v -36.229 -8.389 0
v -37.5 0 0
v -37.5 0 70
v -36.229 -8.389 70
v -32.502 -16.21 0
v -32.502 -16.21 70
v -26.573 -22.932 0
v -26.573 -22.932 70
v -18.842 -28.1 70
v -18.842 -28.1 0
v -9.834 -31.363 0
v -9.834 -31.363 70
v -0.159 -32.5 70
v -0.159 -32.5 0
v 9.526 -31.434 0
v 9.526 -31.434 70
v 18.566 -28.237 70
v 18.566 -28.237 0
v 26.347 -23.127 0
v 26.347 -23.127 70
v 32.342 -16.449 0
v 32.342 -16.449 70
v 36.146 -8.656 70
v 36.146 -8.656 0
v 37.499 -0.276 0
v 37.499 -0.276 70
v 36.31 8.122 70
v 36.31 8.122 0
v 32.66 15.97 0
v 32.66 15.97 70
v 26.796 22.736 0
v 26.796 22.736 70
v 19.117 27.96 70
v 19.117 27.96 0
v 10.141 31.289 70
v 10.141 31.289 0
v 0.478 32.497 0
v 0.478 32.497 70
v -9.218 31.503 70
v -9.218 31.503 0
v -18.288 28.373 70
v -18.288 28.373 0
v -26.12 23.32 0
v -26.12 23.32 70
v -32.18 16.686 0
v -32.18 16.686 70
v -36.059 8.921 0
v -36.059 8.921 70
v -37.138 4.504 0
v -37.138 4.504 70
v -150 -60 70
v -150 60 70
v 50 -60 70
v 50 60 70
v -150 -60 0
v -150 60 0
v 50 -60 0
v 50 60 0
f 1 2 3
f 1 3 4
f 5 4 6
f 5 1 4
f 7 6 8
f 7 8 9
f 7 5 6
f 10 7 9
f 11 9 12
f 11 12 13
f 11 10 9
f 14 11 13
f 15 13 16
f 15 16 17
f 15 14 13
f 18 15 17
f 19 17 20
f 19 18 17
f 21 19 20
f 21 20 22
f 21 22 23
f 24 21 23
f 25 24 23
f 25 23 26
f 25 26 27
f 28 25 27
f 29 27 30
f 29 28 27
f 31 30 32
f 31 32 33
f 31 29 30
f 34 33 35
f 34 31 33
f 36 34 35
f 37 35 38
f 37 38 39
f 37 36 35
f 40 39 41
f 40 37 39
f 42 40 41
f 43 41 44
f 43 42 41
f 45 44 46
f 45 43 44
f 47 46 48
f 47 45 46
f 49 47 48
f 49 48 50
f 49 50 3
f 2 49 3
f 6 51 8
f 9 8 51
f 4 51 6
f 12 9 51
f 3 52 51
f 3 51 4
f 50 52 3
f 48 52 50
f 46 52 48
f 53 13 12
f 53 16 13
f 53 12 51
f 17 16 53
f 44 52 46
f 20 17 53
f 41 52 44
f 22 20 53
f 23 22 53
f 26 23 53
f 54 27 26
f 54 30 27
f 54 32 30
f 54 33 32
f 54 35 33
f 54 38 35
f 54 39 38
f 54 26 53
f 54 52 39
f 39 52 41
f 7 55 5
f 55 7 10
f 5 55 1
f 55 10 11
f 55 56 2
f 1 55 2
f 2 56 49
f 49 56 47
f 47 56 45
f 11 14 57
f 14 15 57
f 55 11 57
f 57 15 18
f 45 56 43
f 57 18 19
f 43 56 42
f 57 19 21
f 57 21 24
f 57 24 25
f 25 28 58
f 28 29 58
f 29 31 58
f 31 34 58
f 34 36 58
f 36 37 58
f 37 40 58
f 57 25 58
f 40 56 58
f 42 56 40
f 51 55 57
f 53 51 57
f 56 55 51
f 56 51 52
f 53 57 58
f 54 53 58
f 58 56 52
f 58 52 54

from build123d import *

# Parameters (mm, degrees)
SKETCH1_W           = 200
SKETCH1_H           = 120
SKETCH1_RX          = 37.5
SKETCH1_RY          = 32.5
BOSS_EXTRUDE1_DEPTH = 70


with BuildPart() as part:
    # Sketch1 → Boss-Extrude1 (new body)
    with BuildSketch(Plane.XY):
        with Locations((-50, 0)):
            Rectangle(SKETCH1_W, SKETCH1_H)
        with Locations(Location((0, 0), (0, 0, 180))):
            Ellipse(SKETCH1_RX, SKETCH1_RY, mode=Mode.SUBTRACT)
    extrude(amount=BOSS_EXTRUDE1_DEPTH)


solid = part.part
